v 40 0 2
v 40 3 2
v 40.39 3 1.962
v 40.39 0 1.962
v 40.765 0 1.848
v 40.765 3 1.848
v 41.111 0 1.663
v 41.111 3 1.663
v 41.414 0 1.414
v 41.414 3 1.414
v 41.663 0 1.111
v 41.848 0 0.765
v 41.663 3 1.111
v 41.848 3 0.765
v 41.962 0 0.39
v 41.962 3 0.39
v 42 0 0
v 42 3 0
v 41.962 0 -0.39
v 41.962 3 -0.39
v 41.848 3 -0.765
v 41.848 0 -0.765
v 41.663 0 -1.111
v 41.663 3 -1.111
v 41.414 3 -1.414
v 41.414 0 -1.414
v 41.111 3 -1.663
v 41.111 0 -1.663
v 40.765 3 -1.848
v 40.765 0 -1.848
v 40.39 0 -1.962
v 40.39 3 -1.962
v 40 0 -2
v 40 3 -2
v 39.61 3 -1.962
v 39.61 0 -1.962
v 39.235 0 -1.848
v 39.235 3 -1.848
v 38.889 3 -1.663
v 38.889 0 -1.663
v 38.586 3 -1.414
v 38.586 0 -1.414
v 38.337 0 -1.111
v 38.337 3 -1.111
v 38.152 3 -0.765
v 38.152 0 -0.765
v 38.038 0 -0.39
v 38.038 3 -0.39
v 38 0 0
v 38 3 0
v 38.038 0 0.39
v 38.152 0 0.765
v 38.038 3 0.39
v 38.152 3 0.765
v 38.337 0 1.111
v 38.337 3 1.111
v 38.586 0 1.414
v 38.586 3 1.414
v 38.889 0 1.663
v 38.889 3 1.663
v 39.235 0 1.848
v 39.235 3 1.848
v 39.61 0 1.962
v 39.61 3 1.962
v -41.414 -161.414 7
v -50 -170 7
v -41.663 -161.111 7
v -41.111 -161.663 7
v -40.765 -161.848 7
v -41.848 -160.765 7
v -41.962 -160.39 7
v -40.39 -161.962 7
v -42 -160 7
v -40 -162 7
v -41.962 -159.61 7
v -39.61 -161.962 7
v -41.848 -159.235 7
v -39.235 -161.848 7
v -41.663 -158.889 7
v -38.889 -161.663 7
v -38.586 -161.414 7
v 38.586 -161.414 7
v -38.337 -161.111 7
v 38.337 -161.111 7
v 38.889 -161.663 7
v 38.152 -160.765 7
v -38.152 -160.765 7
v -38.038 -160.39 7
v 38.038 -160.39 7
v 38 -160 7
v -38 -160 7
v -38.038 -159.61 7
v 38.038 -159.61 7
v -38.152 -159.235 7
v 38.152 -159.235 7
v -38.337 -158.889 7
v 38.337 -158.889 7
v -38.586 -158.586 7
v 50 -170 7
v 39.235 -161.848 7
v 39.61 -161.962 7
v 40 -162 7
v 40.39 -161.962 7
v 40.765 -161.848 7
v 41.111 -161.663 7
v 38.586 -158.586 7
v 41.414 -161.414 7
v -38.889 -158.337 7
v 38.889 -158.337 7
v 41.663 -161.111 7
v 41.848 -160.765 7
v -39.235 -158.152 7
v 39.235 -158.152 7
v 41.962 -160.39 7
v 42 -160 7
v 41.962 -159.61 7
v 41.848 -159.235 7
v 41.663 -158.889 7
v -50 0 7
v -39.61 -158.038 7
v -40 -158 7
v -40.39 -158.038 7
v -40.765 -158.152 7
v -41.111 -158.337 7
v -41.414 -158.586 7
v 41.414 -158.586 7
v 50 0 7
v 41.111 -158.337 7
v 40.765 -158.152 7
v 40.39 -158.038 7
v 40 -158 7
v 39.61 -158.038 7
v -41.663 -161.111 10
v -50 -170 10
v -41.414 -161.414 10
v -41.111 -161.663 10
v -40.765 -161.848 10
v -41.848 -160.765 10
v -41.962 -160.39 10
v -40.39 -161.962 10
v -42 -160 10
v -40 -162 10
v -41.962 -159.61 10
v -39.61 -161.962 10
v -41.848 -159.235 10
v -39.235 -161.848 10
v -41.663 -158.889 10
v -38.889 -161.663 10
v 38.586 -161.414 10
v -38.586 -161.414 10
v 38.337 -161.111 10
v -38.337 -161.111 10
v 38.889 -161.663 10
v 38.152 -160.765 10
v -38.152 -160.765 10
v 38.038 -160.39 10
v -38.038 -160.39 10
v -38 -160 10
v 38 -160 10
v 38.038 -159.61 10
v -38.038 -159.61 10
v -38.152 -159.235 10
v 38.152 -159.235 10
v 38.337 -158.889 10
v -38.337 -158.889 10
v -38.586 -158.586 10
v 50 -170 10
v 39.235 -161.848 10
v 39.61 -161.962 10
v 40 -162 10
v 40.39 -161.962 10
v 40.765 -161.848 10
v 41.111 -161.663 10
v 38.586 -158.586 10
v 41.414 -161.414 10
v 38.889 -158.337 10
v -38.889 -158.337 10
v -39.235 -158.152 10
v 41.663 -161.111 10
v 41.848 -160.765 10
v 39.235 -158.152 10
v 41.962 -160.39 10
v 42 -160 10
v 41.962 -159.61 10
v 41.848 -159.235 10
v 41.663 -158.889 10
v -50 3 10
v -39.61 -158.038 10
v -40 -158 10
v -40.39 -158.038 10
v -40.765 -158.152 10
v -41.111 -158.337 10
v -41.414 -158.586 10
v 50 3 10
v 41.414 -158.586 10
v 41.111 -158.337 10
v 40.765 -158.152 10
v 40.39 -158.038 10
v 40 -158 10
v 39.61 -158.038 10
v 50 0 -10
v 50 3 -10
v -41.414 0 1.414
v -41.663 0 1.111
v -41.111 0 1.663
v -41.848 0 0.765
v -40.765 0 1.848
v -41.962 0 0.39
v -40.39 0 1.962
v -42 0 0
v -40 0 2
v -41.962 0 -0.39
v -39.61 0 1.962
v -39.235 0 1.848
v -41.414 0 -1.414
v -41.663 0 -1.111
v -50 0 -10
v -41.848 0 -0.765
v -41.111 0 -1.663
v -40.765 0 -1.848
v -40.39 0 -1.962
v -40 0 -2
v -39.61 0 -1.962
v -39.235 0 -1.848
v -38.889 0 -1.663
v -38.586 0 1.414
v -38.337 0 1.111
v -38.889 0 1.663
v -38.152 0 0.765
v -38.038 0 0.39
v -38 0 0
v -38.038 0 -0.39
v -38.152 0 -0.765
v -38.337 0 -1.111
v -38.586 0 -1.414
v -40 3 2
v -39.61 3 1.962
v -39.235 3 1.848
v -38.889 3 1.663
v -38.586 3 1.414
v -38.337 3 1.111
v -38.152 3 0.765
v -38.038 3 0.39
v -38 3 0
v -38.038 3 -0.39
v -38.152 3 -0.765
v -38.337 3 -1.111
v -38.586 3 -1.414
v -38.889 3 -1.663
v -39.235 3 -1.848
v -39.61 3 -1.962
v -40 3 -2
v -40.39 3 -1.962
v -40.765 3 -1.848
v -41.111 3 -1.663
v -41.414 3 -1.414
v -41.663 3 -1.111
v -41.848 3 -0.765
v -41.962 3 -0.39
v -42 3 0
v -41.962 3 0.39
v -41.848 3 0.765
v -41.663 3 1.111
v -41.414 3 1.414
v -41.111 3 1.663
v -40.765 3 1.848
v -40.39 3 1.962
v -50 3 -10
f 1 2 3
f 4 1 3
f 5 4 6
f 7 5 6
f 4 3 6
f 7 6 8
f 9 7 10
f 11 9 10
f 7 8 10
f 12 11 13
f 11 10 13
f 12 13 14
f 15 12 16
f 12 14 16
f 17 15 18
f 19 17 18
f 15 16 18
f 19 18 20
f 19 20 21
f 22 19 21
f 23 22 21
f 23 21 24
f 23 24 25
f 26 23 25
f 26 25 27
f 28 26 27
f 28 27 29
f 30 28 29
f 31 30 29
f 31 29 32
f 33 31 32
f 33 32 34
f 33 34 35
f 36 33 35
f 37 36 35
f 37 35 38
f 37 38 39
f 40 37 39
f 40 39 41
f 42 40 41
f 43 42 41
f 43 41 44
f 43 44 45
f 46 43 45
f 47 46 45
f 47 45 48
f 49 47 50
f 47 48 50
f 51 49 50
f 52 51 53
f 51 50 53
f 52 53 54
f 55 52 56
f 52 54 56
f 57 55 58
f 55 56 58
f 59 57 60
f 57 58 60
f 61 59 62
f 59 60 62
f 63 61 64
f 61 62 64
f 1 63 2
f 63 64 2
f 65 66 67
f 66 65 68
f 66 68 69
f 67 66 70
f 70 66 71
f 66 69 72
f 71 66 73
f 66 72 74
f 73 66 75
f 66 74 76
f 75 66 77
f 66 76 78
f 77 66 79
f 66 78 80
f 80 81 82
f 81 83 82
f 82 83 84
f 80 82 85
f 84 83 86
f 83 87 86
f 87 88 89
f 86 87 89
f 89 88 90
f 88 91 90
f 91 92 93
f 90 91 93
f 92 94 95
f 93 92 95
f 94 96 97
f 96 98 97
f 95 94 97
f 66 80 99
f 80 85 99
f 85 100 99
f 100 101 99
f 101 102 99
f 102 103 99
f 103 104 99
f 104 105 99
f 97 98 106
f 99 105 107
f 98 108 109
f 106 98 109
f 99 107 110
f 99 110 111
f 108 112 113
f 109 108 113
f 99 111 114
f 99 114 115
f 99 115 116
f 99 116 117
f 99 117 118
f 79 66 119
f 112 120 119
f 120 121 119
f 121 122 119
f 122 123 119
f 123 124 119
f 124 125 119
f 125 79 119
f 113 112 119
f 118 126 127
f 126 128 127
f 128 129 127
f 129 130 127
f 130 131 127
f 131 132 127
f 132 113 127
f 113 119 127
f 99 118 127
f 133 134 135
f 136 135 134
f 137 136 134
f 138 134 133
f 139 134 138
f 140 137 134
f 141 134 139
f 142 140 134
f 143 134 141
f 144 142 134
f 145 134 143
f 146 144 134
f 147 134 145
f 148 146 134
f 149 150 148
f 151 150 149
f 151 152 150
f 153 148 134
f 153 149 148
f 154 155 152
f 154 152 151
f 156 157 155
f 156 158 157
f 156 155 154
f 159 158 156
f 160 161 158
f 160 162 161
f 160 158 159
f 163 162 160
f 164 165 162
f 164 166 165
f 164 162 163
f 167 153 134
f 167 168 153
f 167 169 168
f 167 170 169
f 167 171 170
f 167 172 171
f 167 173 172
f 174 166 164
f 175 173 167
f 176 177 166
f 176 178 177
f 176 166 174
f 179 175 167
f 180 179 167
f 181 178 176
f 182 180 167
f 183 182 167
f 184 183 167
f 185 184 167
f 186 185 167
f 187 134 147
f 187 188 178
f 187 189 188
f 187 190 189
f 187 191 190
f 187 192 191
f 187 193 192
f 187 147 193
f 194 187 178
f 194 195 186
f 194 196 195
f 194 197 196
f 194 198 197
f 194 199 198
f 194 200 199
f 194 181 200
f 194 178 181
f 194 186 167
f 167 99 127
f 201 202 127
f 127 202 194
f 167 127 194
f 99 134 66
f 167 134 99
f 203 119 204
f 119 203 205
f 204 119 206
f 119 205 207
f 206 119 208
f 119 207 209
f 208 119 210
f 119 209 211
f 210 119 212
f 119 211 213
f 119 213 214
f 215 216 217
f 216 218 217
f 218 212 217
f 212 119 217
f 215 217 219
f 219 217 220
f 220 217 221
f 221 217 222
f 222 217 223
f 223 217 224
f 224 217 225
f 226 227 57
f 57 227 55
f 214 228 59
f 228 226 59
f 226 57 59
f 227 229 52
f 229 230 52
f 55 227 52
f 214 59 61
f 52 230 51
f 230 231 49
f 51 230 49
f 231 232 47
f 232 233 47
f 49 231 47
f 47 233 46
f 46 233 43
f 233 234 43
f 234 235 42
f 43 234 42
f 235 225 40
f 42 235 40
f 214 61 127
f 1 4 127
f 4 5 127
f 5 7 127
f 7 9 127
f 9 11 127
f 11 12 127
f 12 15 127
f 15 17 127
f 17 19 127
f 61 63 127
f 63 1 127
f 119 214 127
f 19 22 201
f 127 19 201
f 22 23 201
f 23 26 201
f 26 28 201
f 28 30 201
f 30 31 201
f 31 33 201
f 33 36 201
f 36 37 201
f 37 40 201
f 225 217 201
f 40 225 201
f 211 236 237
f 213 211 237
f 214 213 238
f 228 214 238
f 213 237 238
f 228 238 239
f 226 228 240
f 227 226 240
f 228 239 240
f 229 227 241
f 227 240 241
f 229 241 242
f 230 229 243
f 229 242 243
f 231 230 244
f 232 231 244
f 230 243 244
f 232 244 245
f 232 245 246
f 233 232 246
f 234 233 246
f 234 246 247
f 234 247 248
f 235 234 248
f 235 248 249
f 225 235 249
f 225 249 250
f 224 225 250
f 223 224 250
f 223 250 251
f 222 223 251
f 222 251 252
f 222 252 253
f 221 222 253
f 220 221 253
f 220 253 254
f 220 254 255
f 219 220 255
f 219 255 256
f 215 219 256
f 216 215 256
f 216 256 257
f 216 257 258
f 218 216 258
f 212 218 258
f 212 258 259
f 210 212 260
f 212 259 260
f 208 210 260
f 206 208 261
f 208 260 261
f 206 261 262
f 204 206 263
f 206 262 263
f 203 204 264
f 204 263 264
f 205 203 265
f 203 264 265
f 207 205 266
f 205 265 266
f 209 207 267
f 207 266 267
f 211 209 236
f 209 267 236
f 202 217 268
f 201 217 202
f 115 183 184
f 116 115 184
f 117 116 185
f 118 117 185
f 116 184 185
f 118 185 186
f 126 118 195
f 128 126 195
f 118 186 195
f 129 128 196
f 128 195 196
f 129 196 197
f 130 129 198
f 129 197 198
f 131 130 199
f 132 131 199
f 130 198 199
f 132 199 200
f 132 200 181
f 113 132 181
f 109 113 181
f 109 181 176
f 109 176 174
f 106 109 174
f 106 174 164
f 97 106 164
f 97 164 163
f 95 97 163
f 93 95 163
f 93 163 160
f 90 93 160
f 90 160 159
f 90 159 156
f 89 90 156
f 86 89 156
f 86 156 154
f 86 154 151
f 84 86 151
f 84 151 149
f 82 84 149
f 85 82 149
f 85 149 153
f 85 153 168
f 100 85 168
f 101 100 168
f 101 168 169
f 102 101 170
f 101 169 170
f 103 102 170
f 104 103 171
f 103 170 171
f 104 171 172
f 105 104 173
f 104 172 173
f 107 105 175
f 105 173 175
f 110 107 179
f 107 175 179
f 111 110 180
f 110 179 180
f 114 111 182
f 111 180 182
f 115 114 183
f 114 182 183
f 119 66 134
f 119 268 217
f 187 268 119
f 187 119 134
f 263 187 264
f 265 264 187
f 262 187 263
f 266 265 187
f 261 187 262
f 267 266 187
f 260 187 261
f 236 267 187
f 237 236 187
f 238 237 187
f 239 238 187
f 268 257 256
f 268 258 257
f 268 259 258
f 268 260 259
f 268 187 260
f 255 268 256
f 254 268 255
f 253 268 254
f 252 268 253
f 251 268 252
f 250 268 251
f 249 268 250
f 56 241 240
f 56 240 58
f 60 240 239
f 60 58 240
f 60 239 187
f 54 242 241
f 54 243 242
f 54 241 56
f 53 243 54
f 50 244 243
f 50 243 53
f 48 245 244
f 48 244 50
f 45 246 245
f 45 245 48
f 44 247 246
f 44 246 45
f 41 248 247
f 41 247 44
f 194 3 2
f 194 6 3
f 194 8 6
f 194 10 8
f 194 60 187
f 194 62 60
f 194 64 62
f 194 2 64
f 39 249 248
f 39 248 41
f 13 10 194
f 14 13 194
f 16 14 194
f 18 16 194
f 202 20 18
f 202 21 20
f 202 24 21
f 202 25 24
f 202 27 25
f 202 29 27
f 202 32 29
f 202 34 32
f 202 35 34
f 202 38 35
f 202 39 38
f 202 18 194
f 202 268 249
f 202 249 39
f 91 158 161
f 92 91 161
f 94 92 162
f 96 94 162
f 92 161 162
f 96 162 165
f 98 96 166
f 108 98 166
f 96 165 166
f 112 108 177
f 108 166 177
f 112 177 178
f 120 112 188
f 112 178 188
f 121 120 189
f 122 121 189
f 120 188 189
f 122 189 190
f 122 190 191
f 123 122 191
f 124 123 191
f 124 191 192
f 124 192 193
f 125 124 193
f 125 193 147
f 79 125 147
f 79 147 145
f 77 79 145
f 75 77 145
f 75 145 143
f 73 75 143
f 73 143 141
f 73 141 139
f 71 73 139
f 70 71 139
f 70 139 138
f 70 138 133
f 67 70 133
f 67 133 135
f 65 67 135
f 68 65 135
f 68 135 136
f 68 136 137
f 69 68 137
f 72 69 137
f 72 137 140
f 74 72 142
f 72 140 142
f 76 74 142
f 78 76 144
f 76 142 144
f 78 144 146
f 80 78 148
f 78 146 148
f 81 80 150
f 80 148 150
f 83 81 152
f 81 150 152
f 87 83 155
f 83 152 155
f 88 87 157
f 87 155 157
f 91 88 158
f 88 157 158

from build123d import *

# Parameters (mm, degrees)
SKETCH1_W           = 100
SKETCH1_H           = 20
BOSS_EXTRUDE1_DEPTH = 3
CUT_EXTRUDE1_REACH  = 53.078
SKETCH2_R           = 2
SKETCH3_W           = 100
SKETCH3_H           = 3
BOSS_EXTRUDE2_DEPTH = 170
CUT_EXTRUDE2_REACH  = 180.326
SKETCH4_R           = 2


with BuildPart() as part:
    # Sketch1 → Boss-Extrude1 (new body)
    with BuildSketch(Plane(origin=(0, 0, 0), x_dir=(1, 0, 0), z_dir=(0, 1, 0))):
        Rectangle(SKETCH1_W, SKETCH1_H)
    extrude(amount=BOSS_EXTRUDE1_DEPTH)

    # Sketch2 → Cut-Extrude1 (cut, up to next)
    with BuildSketch(Plane(origin=(0, 3, 0), x_dir=(1, 0, 0), z_dir=(0, 1, 0)), mode=Mode.PRIVATE) as cut_extrude1_sk1:
        with Locations(Location((40, 0, 0), (0, 0, 270))):
            Circle(SKETCH2_R)
    cut_extrude1_tool1 = extrude(cut_extrude1_sk1.sketch, amount=-CUT_EXTRUDE1_REACH, mode=Mode.PRIVATE) & part.part
    # Sketch2 → Cut-Extrude1 (cut, up to next)
    with BuildSketch(Plane(origin=(0, 3, 0), x_dir=(1, 0, 0), z_dir=(0, 1, 0)), mode=Mode.PRIVATE) as cut_extrude1_sk2:
        with Locations(Location((-40, 0, 0), (0, 0, 270))):
            Circle(SKETCH2_R)
    cut_extrude1_tool2 = extrude(cut_extrude1_sk2.sketch, amount=-CUT_EXTRUDE1_REACH, mode=Mode.PRIVATE) & part.part
    add(cut_extrude1_tool1.solids().sort_by_distance((40, 3, 0))[0], mode=Mode.SUBTRACT)
    add(cut_extrude1_tool2.solids().sort_by_distance((-40, 3, 0))[0], mode=Mode.SUBTRACT)

    # Sketch3 → Boss-Extrude2 (add)
    with BuildSketch(Plane.XZ):
        with Locations((0, 8.5)):
            Rectangle(SKETCH3_W, SKETCH3_H)
    extrude(amount=BOSS_EXTRUDE2_DEPTH)

    # Sketch4 → Cut-Extrude2 (cut, up to next)
    with BuildSketch(Plane.XY.offset(10), mode=Mode.PRIVATE) as cut_extrude2_sk1:
        with Locations((-40, -160)):
            Circle(SKETCH4_R)
    cut_extrude2_tool1 = extrude(cut_extrude2_sk1.sketch, amount=-CUT_EXTRUDE2_REACH, mode=Mode.PRIVATE) & part.part
    # Sketch4 → Cut-Extrude2 (cut, up to next)
    with BuildSketch(Plane.XY.offset(10), mode=Mode.PRIVATE) as cut_extrude2_sk2:
        with Locations((40, -160)):
            Circle(SKETCH4_R)
    cut_extrude2_tool2 = extrude(cut_extrude2_sk2.sketch, amount=-CUT_EXTRUDE2_REACH, mode=Mode.PRIVATE) & part.part
    add(cut_extrude2_tool1.solids().sort_by_distance((-40, -160, 10))[0], mode=Mode.SUBTRACT)
    add(cut_extrude2_tool2.solids().sort_by_distance((40, -160, 10))[0], mode=Mode.SUBTRACT)


solid = part.part
